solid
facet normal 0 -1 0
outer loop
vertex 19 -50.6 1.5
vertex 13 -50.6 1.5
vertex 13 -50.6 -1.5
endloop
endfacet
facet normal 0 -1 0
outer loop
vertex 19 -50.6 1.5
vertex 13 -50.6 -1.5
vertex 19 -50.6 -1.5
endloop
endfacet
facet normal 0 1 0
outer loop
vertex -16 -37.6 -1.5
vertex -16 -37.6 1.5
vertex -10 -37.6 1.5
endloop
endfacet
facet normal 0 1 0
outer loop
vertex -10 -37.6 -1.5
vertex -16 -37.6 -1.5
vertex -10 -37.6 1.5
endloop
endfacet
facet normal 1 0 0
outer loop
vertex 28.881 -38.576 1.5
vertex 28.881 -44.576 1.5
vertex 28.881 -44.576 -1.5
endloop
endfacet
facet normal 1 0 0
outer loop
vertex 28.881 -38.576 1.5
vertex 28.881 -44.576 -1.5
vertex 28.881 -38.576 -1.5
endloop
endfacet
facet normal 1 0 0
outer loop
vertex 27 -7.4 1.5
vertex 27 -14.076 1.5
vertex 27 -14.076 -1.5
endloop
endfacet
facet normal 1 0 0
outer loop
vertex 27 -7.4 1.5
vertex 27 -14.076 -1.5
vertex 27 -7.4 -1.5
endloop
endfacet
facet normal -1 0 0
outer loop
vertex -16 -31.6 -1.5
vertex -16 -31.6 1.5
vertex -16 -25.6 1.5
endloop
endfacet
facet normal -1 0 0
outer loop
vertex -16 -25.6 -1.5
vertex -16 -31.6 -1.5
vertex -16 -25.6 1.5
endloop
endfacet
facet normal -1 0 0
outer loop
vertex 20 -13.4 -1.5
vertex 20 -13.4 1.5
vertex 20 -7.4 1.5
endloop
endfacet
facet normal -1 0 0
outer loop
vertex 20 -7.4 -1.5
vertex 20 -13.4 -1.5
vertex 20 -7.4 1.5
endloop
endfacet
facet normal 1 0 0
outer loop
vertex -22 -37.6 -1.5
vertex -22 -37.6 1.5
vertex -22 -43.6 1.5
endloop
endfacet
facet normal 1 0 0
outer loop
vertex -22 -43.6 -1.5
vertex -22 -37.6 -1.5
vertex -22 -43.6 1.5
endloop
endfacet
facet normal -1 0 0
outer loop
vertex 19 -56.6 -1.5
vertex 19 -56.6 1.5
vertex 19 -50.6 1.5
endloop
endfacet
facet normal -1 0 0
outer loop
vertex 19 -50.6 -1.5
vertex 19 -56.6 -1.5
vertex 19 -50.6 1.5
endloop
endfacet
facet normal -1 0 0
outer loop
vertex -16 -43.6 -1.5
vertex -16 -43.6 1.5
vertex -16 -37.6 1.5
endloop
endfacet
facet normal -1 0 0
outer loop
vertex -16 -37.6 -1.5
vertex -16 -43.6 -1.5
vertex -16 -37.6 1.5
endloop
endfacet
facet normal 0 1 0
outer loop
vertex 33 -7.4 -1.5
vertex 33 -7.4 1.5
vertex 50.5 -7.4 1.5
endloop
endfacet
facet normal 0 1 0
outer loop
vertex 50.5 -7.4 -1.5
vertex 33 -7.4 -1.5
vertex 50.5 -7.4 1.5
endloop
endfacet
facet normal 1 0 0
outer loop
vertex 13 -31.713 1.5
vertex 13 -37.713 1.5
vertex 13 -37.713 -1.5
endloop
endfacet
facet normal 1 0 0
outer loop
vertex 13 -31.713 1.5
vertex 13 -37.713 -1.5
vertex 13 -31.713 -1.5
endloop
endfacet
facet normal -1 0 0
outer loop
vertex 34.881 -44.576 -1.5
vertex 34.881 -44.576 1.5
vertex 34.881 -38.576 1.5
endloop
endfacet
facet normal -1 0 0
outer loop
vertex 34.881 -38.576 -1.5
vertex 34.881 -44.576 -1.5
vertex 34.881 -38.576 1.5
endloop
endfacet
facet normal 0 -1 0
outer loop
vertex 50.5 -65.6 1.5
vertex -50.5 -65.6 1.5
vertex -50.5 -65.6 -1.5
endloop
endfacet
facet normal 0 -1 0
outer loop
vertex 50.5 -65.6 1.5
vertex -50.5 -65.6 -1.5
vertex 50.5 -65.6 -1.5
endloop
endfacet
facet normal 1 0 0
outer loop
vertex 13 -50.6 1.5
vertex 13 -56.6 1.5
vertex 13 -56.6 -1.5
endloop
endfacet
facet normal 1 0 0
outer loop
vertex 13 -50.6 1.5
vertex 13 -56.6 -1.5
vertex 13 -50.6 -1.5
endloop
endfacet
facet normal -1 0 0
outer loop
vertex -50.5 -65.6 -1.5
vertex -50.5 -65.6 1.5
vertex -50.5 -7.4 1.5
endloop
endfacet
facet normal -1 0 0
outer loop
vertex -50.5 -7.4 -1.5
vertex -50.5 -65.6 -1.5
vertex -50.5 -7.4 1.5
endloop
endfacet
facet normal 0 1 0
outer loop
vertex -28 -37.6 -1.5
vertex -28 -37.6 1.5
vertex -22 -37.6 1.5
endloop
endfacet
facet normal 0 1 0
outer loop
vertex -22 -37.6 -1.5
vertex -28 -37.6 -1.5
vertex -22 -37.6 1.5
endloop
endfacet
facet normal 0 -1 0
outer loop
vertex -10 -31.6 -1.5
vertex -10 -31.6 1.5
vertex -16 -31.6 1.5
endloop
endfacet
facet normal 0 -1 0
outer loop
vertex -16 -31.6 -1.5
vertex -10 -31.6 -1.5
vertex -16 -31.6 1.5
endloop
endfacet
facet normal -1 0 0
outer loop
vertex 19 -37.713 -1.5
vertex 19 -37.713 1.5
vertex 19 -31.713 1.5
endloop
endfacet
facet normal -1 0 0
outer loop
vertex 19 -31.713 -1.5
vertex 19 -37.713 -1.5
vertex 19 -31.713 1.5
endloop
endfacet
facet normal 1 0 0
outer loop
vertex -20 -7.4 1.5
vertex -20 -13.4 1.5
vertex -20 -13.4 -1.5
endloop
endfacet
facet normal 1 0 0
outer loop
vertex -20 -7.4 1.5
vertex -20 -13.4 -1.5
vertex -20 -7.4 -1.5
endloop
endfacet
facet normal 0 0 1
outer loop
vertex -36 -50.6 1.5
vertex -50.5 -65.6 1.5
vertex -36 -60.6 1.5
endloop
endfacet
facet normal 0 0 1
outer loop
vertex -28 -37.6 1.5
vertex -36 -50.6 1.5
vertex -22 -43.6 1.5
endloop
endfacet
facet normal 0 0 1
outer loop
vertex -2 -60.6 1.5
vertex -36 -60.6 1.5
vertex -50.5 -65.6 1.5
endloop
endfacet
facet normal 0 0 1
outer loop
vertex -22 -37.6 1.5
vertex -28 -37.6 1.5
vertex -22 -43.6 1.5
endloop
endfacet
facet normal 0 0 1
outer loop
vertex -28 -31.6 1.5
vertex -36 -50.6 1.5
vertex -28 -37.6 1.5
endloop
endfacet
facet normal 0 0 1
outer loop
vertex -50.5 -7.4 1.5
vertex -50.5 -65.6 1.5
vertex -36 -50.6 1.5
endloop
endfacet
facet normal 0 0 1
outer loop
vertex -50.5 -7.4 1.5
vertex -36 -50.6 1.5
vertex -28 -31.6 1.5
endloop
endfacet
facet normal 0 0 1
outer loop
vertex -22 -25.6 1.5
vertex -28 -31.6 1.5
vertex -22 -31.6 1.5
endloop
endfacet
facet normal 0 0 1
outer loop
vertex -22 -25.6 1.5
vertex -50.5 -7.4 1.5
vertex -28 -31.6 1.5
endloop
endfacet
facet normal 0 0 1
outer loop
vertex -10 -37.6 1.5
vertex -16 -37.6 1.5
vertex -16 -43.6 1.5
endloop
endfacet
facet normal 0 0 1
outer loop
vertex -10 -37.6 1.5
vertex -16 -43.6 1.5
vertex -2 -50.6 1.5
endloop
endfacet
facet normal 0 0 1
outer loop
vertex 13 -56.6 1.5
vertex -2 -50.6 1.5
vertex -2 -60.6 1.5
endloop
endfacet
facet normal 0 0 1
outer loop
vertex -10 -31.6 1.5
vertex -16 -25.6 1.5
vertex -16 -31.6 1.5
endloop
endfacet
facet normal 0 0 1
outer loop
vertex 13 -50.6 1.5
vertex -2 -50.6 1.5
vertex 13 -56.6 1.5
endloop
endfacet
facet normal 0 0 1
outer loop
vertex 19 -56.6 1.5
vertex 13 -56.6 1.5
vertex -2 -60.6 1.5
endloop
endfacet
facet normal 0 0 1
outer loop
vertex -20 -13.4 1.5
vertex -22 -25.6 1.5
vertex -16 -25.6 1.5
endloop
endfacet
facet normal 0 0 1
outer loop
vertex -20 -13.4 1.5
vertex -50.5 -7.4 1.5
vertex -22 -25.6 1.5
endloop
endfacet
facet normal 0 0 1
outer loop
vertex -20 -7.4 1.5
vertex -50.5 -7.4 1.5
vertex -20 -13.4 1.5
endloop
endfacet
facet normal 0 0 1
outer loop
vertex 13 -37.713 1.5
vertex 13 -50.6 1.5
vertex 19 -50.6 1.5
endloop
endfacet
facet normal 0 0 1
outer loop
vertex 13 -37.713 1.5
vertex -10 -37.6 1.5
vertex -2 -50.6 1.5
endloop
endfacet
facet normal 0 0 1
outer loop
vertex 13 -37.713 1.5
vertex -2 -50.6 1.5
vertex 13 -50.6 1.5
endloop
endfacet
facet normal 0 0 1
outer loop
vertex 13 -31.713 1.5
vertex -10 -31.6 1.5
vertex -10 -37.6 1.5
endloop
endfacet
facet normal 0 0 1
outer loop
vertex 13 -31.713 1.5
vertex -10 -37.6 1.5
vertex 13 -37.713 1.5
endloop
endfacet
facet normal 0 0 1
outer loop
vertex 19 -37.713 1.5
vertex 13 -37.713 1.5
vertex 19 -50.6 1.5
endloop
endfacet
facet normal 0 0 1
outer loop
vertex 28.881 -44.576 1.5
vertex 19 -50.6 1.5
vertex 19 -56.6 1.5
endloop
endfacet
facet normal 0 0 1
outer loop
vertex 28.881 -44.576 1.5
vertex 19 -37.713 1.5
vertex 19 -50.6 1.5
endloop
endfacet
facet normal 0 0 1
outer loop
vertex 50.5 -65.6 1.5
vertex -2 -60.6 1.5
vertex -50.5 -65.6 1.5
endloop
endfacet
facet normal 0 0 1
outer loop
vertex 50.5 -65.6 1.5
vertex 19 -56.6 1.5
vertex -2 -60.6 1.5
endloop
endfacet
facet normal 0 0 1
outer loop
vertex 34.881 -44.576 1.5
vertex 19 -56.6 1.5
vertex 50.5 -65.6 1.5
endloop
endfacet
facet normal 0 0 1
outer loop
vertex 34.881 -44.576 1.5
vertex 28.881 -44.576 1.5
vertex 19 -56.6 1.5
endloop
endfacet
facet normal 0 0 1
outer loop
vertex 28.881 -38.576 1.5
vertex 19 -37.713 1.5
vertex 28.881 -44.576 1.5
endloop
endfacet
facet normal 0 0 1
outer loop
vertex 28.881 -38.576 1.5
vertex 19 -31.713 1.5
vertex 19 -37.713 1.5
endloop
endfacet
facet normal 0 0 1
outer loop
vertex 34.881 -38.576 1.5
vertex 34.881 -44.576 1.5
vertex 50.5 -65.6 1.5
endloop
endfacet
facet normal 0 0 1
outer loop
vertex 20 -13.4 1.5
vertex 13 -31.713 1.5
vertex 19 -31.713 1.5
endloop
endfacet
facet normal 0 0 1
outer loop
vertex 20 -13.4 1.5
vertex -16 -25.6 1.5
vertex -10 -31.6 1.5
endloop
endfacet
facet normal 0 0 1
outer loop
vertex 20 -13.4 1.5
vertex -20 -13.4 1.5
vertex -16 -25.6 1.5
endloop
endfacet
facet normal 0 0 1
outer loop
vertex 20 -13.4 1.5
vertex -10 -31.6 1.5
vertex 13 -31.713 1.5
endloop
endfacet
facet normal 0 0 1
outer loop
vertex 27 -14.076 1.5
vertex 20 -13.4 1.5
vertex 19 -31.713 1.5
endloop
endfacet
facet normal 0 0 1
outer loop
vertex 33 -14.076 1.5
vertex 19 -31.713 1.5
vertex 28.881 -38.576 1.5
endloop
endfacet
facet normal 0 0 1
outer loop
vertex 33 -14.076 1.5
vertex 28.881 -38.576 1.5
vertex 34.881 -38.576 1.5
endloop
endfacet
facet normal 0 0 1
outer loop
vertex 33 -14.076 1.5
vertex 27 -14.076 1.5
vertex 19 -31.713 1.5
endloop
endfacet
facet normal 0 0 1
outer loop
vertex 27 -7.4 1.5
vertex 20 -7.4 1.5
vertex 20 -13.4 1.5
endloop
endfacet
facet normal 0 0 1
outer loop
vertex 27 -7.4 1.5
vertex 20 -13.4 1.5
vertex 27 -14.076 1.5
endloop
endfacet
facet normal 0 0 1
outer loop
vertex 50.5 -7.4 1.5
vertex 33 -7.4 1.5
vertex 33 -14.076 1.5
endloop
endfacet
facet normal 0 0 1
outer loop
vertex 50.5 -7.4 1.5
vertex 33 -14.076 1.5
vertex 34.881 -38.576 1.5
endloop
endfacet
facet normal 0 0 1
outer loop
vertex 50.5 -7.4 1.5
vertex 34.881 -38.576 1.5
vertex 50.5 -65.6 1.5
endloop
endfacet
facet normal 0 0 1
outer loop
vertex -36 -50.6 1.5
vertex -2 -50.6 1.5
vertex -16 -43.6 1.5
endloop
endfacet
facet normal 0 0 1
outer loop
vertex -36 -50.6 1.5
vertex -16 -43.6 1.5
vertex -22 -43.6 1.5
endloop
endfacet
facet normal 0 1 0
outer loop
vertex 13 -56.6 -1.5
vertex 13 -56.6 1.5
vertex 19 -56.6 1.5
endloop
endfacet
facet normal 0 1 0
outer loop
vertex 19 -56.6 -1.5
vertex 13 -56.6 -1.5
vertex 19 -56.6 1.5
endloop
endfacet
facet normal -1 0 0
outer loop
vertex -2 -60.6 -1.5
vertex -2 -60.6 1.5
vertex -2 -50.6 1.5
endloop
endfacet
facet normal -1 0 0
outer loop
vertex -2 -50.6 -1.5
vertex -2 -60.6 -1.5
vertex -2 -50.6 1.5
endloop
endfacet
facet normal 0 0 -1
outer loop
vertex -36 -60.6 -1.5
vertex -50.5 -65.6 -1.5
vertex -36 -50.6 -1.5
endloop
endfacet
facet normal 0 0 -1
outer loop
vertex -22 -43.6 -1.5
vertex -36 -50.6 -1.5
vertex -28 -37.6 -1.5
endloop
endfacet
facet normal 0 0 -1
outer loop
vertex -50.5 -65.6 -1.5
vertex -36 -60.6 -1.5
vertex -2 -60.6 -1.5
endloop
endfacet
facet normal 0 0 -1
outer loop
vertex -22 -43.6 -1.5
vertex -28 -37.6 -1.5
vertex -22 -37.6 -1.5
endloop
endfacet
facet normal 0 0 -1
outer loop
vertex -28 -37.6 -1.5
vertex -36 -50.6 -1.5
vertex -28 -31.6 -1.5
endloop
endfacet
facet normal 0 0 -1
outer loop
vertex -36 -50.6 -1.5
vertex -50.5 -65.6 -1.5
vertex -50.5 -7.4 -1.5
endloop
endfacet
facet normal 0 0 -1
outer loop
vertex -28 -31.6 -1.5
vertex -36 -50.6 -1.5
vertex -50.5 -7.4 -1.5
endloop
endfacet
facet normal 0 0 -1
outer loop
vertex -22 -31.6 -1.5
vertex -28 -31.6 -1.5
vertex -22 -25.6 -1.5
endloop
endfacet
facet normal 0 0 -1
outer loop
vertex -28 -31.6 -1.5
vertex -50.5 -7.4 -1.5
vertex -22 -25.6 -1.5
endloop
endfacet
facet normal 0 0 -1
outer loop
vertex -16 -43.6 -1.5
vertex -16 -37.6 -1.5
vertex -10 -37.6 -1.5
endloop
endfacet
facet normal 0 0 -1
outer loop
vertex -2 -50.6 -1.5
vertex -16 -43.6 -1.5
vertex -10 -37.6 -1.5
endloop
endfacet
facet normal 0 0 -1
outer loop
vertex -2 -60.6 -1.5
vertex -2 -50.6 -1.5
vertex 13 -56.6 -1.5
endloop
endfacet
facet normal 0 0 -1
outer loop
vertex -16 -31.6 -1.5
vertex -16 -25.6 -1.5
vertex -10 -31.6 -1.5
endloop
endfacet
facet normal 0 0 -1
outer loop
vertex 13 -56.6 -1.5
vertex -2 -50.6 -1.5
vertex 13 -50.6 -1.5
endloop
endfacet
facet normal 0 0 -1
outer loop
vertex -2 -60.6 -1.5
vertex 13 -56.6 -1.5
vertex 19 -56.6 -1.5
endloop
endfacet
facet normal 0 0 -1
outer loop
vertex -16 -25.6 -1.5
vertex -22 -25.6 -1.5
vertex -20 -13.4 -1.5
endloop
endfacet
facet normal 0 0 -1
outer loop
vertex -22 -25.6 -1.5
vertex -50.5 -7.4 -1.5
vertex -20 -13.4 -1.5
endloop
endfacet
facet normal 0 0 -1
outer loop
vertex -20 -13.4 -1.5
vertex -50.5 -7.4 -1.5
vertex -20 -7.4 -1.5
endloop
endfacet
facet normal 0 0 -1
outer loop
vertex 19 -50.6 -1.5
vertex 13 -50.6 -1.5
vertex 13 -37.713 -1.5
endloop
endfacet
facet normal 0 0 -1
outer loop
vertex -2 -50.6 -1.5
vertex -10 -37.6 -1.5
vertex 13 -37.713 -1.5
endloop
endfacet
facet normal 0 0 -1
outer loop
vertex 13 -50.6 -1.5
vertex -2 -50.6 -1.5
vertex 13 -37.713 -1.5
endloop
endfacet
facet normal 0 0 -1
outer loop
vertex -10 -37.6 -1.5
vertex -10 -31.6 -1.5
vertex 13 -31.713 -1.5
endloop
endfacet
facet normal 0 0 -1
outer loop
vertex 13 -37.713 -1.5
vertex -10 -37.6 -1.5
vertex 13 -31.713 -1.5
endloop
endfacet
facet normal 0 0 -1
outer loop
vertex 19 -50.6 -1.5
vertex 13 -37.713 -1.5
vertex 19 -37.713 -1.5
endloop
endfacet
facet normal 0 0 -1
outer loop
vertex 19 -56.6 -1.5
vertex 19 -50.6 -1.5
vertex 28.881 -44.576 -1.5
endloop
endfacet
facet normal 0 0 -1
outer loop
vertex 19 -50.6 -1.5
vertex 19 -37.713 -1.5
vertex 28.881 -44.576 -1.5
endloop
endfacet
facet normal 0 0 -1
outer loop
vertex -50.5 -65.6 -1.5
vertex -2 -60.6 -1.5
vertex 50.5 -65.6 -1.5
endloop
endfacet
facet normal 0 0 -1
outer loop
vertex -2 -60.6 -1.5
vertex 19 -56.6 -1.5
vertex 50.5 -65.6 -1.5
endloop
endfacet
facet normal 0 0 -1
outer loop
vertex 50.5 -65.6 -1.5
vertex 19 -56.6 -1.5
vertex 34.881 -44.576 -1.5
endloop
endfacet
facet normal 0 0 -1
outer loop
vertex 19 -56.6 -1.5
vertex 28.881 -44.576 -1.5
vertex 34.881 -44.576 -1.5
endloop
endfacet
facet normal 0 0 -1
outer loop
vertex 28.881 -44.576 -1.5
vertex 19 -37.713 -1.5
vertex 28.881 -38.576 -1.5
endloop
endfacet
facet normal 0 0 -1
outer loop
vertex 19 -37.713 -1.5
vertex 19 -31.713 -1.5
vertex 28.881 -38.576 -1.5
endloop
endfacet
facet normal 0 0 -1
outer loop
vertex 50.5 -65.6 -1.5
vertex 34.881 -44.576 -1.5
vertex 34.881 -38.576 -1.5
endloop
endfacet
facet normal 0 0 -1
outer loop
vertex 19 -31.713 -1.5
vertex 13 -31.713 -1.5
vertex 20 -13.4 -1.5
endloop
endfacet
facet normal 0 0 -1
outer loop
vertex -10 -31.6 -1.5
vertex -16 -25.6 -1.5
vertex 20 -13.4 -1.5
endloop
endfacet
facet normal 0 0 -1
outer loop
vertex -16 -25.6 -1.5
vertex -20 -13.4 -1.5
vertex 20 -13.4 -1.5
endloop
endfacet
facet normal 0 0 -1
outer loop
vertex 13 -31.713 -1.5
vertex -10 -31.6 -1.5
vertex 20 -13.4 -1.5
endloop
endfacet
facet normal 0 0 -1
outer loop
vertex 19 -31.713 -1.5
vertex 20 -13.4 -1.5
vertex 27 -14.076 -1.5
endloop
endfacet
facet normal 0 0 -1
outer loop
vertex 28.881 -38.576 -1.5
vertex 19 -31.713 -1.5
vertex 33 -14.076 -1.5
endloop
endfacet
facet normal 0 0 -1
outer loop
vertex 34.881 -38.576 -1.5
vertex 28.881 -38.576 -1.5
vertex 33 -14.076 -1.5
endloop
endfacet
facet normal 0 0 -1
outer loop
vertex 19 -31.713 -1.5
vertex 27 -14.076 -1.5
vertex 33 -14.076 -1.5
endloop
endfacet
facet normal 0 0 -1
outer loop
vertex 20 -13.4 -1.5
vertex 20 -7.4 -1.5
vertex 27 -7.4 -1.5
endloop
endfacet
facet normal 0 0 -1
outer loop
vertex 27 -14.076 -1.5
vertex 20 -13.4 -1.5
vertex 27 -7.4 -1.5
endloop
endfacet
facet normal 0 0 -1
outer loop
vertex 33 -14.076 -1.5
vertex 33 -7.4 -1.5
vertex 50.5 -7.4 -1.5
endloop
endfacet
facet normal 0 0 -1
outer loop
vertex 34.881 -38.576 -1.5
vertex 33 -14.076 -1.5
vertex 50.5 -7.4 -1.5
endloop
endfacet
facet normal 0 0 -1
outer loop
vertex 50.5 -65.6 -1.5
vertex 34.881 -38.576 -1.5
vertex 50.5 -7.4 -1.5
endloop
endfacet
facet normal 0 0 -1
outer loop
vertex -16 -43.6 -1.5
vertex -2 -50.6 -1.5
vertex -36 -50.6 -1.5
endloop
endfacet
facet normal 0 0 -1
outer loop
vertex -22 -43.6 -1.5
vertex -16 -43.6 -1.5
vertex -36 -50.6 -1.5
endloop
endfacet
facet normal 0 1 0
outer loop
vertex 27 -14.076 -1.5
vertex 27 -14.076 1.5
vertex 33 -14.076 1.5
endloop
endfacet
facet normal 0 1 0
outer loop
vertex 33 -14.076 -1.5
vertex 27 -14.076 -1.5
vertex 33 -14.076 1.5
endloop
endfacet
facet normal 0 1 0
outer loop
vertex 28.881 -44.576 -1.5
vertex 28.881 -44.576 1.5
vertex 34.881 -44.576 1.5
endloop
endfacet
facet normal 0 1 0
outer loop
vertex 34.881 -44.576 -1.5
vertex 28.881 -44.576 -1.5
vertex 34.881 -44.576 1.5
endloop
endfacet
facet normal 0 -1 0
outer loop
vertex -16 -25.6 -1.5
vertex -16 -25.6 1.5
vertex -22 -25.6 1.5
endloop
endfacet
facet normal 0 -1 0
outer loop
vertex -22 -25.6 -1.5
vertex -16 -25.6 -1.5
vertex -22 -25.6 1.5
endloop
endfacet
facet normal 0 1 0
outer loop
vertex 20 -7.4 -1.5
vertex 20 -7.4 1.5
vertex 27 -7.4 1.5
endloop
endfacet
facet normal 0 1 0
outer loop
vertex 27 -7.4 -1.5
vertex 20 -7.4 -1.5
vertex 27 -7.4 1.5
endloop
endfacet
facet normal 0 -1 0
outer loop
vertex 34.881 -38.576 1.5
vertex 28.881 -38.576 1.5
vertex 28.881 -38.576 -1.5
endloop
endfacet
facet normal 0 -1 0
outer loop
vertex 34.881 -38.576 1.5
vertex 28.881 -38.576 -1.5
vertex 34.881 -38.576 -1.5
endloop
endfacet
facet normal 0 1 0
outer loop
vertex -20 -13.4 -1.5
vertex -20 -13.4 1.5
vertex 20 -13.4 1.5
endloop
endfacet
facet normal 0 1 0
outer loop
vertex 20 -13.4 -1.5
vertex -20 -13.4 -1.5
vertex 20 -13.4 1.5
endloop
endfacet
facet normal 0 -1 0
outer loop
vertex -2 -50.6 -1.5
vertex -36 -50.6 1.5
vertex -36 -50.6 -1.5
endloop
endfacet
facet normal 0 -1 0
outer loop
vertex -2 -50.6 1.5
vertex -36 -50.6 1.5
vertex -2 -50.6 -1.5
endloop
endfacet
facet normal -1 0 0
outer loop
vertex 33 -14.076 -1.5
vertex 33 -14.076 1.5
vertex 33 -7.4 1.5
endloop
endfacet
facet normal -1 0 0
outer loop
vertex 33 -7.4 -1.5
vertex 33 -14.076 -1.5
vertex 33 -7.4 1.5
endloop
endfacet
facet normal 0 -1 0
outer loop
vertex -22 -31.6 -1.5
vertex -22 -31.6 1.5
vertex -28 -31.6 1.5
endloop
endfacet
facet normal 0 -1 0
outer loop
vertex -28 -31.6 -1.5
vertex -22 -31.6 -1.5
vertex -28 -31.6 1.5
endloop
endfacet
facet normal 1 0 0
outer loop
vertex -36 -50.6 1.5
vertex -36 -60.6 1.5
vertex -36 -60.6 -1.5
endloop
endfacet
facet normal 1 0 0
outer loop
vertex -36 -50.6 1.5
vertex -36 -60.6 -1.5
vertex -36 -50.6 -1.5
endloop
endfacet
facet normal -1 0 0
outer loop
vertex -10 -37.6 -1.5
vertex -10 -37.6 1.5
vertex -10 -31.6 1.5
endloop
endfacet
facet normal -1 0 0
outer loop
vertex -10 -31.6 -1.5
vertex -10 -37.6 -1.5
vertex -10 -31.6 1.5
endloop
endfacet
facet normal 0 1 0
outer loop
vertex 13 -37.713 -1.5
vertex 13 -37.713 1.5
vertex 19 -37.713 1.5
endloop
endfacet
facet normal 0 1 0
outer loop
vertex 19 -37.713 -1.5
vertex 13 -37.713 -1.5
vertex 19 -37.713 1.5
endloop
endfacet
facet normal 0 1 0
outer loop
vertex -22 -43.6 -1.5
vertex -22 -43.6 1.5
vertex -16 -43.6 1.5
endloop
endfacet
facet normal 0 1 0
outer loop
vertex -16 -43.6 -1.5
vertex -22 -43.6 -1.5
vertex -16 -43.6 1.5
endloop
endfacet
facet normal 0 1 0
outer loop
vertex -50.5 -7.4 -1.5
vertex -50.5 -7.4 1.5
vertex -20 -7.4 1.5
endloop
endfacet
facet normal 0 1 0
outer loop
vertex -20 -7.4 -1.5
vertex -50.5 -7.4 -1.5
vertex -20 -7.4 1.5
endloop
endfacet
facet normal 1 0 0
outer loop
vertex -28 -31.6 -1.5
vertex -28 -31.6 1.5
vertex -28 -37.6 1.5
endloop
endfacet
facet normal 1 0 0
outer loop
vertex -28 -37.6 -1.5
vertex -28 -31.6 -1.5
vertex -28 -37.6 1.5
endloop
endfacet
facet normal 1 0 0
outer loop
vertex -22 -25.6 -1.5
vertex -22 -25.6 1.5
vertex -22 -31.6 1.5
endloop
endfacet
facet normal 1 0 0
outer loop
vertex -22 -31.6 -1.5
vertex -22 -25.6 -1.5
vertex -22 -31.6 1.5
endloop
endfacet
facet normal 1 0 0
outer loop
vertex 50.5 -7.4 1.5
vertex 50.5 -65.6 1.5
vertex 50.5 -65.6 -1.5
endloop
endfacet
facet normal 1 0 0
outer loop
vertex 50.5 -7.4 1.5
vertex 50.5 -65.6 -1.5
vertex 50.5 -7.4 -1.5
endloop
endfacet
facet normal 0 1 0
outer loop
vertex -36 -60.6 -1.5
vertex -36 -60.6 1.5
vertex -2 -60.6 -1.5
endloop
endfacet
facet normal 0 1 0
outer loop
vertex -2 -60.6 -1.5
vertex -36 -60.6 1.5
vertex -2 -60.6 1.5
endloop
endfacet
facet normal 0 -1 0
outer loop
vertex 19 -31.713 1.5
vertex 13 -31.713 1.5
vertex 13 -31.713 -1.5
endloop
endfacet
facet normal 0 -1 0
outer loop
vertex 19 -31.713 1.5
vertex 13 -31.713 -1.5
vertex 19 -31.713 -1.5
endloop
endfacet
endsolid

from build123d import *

# Parameters (mm, degrees)
SKETCH1_W           = 101
SKETCH1_H           = 58.2
BOSS_EXTRUDE1_DEPTH = 1.5
SKETCH2_W           = 6
SKETCH2_H           = 6
SKETCH2_W_2         = 40
SKETCH2_H_2         = 8
SKETCH2_W_3         = 34
SKETCH2_H_3         = 10
CUT_EXTRUDE2_DEPTH  = 83.840871555


with BuildPart() as part:
    # Sketch1 → Boss-Extrude1 (new, symmetric)
    with BuildSketch(Plane.XY):
        with Locations((0, -36.5)):
            Rectangle(SKETCH1_W, SKETCH1_H)
    extrude(amount=BOSS_EXTRUDE1_DEPTH, both=True)

    # Sketch2 → Cut-Extrude2 (cut, through all)
    with BuildSketch(Plane.XY.offset(1.5)):
        with Locations((16, -34.713248654)):
            Rectangle(SKETCH2_W, SKETCH2_H)
        with Locations((31.881445826, -41.57558602)):
            Rectangle(SKETCH2_W, SKETCH2_H)
        with Locations((0, -10.4)):
            Rectangle(SKETCH2_W_2, SKETCH2_H)
        with Locations((16, -53.6)):
            Rectangle(SKETCH2_W, SKETCH2_H)
        Polygon((-22, -43.6), (-16, -43.6), (-16, -37.6), (-10, -37.6), (-10, -31.6), (-16, -31.6), (-16, -25.6), (-22, -25.6), (-22, -31.6), (-28, -31.6), (-28, -37.6), (-22, -37.6), align=None)
        with Locations((30, -10.07558602)):
            Rectangle(SKETCH2_W, SKETCH2_H_2)
        with Locations((-19, -55.6)):
            Rectangle(SKETCH2_W_3, SKETCH2_H_3)
    extrude(amount=-CUT_EXTRUDE2_DEPTH, mode=Mode.SUBTRACT)


solid = part.part
